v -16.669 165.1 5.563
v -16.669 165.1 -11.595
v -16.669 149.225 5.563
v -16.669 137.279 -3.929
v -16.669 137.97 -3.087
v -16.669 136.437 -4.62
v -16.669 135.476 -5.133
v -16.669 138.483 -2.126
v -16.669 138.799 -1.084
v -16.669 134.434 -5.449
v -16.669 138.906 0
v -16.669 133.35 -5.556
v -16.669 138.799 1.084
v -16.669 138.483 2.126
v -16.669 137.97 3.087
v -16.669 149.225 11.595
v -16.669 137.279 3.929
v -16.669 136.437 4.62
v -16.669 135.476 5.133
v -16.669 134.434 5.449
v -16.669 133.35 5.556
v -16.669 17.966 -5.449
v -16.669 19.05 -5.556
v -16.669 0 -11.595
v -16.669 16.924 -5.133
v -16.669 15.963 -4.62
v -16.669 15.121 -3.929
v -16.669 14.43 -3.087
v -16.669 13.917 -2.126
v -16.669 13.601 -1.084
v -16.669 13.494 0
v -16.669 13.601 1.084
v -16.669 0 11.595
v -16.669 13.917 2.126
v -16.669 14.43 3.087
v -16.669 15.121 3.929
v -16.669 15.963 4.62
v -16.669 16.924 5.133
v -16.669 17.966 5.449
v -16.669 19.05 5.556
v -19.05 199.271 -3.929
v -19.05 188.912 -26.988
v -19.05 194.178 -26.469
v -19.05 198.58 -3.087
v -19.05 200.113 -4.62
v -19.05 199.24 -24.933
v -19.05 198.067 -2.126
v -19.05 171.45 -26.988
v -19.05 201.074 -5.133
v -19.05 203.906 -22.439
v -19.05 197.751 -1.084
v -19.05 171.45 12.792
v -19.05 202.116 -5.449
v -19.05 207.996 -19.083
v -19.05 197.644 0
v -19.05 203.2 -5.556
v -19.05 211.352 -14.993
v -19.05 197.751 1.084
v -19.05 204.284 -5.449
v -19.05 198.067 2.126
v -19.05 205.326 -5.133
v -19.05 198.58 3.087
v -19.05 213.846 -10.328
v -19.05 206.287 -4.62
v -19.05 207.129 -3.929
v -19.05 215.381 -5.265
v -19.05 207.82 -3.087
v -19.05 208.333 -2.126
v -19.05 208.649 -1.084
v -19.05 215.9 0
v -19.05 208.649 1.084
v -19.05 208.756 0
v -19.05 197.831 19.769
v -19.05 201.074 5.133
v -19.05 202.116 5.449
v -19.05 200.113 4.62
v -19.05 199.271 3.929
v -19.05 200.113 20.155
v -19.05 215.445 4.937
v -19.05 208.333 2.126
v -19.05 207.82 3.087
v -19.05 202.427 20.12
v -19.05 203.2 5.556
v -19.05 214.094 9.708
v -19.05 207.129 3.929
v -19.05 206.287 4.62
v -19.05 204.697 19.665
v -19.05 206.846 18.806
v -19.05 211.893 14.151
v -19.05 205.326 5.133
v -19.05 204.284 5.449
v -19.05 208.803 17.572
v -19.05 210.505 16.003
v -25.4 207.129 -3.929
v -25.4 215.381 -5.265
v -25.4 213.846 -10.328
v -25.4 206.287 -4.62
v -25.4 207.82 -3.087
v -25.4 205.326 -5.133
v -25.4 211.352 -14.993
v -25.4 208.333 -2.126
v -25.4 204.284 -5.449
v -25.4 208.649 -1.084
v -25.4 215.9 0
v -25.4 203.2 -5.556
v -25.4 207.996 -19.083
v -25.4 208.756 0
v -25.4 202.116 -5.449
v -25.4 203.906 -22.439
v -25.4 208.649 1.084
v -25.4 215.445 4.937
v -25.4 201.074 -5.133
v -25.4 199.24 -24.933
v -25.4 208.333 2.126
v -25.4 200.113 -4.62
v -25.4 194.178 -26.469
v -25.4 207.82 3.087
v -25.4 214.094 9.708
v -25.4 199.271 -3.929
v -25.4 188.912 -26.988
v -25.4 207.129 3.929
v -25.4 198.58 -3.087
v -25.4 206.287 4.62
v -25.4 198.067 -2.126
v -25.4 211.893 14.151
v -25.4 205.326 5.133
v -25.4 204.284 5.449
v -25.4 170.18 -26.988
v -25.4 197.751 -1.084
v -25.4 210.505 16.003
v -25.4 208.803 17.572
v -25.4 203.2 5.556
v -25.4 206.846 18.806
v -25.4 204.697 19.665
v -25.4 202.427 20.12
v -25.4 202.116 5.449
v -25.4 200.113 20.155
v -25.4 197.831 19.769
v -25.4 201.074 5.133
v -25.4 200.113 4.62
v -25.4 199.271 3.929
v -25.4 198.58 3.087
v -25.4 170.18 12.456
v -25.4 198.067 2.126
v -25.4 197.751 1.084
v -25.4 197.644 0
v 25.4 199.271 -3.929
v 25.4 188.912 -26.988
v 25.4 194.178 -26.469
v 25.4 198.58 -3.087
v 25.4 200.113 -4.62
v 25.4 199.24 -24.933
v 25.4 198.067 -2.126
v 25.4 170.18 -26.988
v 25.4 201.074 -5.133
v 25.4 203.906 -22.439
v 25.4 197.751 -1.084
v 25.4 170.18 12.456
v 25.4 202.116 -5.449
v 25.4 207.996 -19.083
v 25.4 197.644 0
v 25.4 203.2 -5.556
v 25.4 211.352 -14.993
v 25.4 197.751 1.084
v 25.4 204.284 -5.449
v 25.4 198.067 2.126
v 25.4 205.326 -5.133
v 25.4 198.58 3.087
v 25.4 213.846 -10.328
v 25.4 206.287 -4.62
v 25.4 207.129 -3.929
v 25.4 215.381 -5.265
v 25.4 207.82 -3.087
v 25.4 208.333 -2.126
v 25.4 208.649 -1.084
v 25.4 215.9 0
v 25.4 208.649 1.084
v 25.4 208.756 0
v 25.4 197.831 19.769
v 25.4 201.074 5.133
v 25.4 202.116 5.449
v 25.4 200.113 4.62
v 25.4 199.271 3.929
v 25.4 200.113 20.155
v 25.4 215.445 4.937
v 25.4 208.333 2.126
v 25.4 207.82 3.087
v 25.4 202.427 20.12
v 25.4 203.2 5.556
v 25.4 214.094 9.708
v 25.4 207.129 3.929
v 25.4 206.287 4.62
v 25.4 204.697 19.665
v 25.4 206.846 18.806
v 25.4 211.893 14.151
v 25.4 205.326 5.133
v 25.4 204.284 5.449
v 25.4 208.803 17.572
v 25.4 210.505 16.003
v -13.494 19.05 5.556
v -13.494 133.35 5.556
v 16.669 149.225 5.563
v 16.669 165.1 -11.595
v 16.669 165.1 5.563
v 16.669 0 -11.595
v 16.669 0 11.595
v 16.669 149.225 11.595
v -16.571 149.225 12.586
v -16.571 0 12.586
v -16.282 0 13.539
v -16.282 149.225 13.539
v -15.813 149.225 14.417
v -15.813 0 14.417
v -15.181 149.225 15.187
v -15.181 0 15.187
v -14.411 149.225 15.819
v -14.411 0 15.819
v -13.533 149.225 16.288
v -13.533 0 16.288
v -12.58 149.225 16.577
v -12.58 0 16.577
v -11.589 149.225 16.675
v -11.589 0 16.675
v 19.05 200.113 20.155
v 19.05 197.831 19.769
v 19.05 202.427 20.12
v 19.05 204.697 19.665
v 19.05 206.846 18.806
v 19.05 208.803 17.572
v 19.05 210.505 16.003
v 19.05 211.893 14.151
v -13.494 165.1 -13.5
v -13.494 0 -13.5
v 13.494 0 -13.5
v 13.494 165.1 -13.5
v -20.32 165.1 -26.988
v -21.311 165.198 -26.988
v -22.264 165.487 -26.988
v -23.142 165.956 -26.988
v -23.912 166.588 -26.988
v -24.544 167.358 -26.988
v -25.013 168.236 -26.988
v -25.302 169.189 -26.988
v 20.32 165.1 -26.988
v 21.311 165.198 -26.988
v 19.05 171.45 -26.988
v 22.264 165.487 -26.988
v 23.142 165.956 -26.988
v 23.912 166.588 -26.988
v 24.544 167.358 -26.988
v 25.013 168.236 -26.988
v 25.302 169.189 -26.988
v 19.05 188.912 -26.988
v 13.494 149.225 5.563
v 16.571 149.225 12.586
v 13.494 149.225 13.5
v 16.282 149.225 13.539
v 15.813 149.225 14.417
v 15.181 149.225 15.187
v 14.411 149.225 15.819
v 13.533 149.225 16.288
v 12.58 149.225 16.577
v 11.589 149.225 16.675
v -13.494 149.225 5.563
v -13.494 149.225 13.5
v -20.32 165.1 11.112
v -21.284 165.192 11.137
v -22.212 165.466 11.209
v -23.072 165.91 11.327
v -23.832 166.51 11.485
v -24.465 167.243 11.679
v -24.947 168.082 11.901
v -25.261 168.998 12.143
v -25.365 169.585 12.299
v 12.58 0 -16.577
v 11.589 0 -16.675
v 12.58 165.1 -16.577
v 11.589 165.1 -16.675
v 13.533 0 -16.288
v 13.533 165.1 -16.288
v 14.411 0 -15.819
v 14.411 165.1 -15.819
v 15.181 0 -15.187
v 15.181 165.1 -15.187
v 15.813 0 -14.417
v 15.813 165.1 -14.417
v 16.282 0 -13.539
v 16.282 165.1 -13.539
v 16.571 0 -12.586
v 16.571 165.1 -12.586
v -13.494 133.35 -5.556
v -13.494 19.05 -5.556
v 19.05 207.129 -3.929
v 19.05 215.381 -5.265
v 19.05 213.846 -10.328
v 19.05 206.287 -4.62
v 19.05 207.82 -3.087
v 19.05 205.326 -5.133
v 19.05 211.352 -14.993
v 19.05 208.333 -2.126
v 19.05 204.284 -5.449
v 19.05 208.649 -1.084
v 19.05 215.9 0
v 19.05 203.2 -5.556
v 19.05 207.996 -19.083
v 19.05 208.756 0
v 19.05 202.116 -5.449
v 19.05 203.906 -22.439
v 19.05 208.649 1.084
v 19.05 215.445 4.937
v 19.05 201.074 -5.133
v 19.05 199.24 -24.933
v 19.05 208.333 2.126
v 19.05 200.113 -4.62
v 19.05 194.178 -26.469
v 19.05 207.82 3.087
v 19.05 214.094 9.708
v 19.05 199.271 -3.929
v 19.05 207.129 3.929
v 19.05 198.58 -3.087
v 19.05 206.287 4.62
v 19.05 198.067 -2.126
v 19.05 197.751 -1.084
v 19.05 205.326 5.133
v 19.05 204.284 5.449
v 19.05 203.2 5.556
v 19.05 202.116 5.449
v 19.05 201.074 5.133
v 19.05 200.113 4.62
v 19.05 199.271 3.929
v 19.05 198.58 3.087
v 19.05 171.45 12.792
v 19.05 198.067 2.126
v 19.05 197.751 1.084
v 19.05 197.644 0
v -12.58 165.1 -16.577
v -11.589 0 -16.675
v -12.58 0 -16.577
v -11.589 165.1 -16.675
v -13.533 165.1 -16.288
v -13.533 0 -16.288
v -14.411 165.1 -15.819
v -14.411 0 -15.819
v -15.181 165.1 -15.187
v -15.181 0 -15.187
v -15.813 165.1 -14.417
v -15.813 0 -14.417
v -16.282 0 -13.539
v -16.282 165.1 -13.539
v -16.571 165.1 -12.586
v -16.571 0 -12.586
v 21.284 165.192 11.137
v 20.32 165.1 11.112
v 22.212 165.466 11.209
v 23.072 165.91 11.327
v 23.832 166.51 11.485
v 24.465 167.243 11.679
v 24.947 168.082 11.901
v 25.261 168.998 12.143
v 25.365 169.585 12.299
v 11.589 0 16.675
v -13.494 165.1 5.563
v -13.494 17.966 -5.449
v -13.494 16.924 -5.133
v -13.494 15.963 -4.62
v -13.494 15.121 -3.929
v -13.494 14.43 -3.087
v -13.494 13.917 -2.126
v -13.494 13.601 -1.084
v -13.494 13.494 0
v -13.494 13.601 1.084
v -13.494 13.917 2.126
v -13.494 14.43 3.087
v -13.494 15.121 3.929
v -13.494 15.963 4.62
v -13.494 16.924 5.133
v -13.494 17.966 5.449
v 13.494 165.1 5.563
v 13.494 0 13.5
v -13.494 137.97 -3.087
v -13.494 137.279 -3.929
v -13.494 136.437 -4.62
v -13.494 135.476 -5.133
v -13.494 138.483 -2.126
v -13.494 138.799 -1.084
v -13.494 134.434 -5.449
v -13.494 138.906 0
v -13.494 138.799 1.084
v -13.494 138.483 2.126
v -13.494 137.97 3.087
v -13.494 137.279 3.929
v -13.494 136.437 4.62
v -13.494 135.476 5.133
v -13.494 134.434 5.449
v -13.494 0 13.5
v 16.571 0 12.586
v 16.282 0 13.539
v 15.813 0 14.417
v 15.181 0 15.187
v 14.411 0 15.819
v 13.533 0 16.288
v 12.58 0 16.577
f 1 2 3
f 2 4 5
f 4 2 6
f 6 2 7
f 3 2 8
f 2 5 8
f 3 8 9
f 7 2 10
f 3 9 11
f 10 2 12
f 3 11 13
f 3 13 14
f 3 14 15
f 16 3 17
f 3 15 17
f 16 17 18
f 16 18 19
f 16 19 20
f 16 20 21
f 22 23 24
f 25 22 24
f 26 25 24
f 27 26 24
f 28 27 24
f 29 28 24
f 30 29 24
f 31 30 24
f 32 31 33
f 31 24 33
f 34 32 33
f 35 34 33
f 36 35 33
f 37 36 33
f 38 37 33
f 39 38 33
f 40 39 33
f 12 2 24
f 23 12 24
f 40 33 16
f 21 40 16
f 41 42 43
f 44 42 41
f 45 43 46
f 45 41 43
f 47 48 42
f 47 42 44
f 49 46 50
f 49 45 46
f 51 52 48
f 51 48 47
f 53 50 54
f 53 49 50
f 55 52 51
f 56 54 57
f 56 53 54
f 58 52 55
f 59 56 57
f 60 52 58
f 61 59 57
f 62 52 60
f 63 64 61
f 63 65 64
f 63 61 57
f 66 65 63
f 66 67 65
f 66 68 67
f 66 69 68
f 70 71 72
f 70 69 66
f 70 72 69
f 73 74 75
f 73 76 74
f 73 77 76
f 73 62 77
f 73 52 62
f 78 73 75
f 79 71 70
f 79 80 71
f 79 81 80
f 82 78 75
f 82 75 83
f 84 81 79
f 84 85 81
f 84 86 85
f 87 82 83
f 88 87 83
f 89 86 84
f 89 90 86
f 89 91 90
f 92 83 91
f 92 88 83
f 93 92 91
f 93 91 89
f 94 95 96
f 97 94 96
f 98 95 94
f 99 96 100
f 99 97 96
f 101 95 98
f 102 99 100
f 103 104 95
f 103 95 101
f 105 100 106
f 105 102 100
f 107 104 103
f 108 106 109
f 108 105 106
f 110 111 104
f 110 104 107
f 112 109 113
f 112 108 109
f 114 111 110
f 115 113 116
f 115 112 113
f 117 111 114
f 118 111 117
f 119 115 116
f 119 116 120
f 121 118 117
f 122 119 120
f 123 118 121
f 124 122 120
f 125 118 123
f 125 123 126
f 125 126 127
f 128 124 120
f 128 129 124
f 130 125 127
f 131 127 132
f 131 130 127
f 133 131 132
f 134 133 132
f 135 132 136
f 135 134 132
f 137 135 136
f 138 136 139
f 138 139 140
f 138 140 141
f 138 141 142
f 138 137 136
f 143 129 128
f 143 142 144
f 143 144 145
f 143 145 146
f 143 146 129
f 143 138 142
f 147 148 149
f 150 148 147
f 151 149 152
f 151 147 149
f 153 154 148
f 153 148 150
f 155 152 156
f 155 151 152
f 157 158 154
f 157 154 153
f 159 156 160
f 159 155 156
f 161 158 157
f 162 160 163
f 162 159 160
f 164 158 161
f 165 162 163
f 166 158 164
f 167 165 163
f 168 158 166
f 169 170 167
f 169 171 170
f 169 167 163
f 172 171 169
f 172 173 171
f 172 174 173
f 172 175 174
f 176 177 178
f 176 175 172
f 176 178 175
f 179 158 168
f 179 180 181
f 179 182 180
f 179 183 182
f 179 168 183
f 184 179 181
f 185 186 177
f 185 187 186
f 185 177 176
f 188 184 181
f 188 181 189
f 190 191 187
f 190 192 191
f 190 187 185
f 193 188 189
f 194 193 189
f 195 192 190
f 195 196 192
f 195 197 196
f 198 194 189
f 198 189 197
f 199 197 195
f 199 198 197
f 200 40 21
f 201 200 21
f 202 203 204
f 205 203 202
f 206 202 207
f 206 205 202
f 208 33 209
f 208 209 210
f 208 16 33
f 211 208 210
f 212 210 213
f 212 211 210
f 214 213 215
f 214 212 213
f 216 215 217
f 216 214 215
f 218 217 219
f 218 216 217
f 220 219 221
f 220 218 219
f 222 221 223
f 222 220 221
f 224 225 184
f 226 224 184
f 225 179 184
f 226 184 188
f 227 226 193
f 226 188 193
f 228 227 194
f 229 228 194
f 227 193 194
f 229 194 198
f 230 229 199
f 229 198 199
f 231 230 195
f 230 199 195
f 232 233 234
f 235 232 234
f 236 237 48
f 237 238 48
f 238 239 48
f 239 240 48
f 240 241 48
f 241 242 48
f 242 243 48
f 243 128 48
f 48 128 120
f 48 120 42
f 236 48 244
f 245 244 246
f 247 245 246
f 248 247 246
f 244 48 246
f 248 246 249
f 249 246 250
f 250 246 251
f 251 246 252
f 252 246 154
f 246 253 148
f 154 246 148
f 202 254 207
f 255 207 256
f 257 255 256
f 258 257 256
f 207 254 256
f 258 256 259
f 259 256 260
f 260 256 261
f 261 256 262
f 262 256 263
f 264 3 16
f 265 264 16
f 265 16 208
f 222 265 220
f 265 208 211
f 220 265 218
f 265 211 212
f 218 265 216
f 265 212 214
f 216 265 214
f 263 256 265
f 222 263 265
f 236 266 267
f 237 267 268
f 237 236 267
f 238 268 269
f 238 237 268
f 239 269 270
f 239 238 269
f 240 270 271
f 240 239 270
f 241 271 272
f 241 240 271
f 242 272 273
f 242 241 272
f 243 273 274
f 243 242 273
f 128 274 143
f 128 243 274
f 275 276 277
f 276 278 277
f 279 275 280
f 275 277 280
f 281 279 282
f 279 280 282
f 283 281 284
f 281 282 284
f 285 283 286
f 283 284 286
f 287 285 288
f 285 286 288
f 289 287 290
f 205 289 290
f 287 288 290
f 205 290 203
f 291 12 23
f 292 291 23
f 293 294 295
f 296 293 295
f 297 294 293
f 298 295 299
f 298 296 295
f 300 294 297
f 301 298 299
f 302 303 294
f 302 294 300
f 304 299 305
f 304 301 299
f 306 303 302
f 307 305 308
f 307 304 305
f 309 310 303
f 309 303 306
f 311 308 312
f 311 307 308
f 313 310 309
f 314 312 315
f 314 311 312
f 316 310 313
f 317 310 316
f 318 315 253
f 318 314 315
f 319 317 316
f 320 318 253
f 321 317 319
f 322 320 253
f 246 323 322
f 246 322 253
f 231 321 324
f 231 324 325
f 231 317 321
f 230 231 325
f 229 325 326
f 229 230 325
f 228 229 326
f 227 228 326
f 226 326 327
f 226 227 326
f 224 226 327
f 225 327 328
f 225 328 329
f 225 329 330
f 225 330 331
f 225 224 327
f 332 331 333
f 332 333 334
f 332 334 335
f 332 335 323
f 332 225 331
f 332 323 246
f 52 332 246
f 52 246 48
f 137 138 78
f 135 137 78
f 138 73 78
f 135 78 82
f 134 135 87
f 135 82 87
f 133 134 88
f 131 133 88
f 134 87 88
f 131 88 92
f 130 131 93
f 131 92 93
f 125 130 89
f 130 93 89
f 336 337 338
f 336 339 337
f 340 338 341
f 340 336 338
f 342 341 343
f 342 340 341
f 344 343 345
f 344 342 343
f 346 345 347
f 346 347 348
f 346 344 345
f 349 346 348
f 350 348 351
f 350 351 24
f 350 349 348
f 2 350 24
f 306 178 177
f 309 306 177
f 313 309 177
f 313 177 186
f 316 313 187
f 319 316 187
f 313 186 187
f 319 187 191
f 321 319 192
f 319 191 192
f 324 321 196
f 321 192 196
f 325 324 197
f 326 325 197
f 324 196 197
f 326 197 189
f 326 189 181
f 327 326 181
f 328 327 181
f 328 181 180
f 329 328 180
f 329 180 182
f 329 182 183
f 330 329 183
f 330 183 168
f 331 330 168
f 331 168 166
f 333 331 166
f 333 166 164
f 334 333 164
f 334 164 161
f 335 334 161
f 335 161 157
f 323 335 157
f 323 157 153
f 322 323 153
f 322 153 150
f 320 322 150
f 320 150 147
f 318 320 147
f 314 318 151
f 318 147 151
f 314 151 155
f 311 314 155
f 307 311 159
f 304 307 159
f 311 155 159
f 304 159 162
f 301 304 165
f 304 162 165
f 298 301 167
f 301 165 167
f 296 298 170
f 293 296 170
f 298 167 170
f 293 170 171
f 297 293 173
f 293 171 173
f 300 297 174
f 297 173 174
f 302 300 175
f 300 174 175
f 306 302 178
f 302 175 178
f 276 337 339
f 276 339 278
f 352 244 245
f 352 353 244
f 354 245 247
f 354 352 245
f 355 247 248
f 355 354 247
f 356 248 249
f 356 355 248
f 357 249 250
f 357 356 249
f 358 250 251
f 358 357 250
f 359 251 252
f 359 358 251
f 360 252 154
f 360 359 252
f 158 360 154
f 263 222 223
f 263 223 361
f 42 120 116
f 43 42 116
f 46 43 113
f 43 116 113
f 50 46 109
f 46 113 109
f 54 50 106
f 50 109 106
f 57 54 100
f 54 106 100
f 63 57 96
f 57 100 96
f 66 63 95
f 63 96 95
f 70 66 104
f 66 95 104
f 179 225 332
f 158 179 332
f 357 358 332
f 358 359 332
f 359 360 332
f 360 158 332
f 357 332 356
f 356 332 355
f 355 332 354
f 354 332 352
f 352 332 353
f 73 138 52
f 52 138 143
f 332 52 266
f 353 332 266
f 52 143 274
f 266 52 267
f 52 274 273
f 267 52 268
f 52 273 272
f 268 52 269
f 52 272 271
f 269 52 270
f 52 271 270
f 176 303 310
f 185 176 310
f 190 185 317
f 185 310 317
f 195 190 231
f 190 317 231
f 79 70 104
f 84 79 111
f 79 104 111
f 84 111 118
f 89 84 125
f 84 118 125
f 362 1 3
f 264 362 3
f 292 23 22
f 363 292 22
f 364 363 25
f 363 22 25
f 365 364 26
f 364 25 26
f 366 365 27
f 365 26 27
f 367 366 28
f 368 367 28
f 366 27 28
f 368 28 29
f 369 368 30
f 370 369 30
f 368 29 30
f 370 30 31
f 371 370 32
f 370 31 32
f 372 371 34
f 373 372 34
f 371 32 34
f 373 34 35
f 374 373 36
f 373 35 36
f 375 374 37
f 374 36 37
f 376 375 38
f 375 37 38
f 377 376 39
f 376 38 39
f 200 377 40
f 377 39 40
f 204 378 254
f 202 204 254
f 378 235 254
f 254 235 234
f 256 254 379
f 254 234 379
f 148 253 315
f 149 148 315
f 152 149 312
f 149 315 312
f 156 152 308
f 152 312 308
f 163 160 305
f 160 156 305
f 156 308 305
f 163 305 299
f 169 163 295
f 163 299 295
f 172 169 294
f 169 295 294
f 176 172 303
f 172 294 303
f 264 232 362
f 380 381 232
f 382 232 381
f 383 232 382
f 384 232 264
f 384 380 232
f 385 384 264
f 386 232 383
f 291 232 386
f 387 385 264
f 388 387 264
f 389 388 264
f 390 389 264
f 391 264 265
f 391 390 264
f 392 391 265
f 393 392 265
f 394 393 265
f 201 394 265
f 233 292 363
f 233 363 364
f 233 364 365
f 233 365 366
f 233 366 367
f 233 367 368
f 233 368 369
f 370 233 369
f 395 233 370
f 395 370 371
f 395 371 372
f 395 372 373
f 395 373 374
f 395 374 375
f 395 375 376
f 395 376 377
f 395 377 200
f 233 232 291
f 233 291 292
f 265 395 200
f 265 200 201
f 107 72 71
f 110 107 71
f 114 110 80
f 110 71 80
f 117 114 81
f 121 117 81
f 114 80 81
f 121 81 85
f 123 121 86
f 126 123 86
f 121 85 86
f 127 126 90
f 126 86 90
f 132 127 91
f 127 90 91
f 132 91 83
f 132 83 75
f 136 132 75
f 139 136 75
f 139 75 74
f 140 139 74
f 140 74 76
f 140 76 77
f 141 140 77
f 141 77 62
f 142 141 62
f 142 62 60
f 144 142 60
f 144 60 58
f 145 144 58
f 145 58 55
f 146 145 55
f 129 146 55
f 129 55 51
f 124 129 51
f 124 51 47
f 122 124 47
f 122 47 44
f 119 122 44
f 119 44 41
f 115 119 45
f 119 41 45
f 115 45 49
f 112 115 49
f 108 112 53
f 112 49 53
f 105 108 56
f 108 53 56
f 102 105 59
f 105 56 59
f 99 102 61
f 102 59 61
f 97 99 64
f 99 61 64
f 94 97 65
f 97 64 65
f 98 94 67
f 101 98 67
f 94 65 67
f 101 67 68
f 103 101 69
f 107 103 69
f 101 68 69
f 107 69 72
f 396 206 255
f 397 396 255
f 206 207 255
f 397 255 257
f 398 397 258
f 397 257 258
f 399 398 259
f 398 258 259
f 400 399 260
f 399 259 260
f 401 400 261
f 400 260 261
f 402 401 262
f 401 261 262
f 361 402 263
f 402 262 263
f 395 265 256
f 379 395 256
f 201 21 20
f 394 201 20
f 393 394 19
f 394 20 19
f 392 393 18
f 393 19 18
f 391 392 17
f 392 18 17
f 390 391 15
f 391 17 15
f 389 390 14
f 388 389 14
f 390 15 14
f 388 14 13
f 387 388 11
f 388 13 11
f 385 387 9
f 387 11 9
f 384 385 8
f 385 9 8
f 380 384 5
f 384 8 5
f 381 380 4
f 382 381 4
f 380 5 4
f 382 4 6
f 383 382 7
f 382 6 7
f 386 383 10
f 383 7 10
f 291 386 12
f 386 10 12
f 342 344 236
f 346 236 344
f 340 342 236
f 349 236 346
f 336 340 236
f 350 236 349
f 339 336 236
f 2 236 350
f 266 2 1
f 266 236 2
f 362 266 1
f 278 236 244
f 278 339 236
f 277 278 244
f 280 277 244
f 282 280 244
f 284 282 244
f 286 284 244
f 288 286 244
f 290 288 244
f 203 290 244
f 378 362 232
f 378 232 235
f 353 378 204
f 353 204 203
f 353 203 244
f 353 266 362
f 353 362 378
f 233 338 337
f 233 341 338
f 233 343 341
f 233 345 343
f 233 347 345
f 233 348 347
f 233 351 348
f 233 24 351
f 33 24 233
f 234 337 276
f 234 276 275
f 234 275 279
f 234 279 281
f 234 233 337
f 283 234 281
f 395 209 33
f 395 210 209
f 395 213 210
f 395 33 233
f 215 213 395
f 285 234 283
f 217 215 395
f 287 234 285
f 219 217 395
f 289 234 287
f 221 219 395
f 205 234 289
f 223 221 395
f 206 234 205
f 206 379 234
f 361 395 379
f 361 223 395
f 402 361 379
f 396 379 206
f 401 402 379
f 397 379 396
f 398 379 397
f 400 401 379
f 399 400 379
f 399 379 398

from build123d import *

# Parameters (mm, degrees)
F0_W      = 33.3375
F0_H      = 33.3502
F0_W_2    = 26.9875
F0_H_2    = 27.0002
F1_DEPTH  = 165.1
F2_W      = 15.875
F2_H      = 11.1125
F3_DEPTH  = 33.3385
F5_DEPTH  = 26.9875
F7_DEPTH  = 50.801
F8_R      = 5.08
F9_R      = 12.7
F11_D     = 11.1125
F13_DEPTH = 3.175


with BuildPart() as f1:
    # F0 (on Front) → F1 (new body)
    with BuildSketch(Plane.XZ):
        Rectangle(F0_W, F0_H)
        Rectangle(F0_W_2, F0_H_2, mode=Mode.SUBTRACT)
    extrude(amount=-F1_DEPTH)

    # F2 (on face) → F3 (cut, through all)
    with BuildSketch(Plane(origin=(-16.66875, 0, 0), x_dir=(0, -1, 0), z_dir=(-1, 0, 0))):
        with Locations((-157.1625, 11.11885)):
            Rectangle(F2_W, F2_H)
    extrude(amount=-F3_DEPTH, mode=Mode.SUBTRACT)

    # F4 (on Top) → F5 (join, symmetric)
    with BuildSketch(Plane.XY):
        Polygon((-25.4, 165.1), (25.4, 165.1), (25.4, 215.9), (19.05, 215.9), (19.05, 171.45), (-19.05, 171.45), (-19.05, 215.9), (-25.4, 215.9), align=None)
    extrude(amount=F5_DEPTH, both=True)

    # F6 (on face) → F7 (cut, through all)
    with BuildSketch(Plane(origin=(-25.4, 0, 0), x_dir=(0, -1, 0), z_dir=(-1, 0, 0))):
        with BuildLine():
            ThreePointArc((-215.9, -7.09e-08), (-213.0223149727, 12.1260866825), (-205.002956628, 21.6661570601))
            Line((-205.002956628, 21.6661570601), (-165.1, 11.1125))
            Line((-165.1, 11.1125), (-165.1, 26.9875))
            Line((-165.1, 26.9875), (-215.9, 26.9875))
            Line((-215.9, 26.9875), (-215.9, -7.09e-08))
        make_face()
        with BuildLine():
            ThreePointArc((-188.9125, -26.9875), (-207.9955442322, -19.0830442823), (-215.9, -7.09e-08))
            Line((-215.9, -7.09e-08), (-215.9, -26.9875))
            Line((-215.9, -26.9875), (-188.9125, -26.9875))
        make_face()
    extrude(amount=-F7_DEPTH, mode=Mode.SUBTRACT)

    # F8
    f8_edges = [f1.edges().sort_by_distance(p)[0] for p in [
        (-25.4, 165.1, -7.9375),
        (25.4, 165.1, -7.9375),
        (-16.66875, 74.6125, 16.6751),
        (16.66875, 74.6125, 16.6751),
        (-16.66875, 82.55, -16.6751),
        (16.66875, 82.55, -16.6751),
    ]]
    fillet(f8_edges, radius=F8_R)

    # F9
    f9_edges = [f1.edges().sort_by_distance(p)[0] for p in [
        (22.225, 205.002957, 21.666157),
        (-22.225, 205.002957, 21.666157),
    ]]
    fillet(f9_edges, radius=F9_R)

    # F11 (through all)
    with Locations(Plane(origin=(-25.4, 0, 0), x_dir=(0, -1, 0), z_dir=(-1, 0, 0))):
        with Locations((-203.2, 0)):
            Hole(F11_D / 2)

    # F12 (on face) → F13 (cut, through all)
    with BuildSketch(Plane(origin=(-16.66875, 0, 0), x_dir=(0, -1, 0), z_dir=(-1, 0, 0))):
        with BuildLine():
            Line((-19.05, 5.55625), (-133.35, 5.55625))
            ThreePointArc((-133.35, 5.55625), (-138.90625, 0), (-133.35, -5.55625))
            Line((-133.35, -5.55625), (-19.05, -5.55625))
            ThreePointArc((-19.05, -5.55625), (-13.49375, 0), (-19.05, 5.55625))
        make_face()
    extrude(amount=-F13_DEPTH, mode=Mode.SUBTRACT)


solid = f1.part
